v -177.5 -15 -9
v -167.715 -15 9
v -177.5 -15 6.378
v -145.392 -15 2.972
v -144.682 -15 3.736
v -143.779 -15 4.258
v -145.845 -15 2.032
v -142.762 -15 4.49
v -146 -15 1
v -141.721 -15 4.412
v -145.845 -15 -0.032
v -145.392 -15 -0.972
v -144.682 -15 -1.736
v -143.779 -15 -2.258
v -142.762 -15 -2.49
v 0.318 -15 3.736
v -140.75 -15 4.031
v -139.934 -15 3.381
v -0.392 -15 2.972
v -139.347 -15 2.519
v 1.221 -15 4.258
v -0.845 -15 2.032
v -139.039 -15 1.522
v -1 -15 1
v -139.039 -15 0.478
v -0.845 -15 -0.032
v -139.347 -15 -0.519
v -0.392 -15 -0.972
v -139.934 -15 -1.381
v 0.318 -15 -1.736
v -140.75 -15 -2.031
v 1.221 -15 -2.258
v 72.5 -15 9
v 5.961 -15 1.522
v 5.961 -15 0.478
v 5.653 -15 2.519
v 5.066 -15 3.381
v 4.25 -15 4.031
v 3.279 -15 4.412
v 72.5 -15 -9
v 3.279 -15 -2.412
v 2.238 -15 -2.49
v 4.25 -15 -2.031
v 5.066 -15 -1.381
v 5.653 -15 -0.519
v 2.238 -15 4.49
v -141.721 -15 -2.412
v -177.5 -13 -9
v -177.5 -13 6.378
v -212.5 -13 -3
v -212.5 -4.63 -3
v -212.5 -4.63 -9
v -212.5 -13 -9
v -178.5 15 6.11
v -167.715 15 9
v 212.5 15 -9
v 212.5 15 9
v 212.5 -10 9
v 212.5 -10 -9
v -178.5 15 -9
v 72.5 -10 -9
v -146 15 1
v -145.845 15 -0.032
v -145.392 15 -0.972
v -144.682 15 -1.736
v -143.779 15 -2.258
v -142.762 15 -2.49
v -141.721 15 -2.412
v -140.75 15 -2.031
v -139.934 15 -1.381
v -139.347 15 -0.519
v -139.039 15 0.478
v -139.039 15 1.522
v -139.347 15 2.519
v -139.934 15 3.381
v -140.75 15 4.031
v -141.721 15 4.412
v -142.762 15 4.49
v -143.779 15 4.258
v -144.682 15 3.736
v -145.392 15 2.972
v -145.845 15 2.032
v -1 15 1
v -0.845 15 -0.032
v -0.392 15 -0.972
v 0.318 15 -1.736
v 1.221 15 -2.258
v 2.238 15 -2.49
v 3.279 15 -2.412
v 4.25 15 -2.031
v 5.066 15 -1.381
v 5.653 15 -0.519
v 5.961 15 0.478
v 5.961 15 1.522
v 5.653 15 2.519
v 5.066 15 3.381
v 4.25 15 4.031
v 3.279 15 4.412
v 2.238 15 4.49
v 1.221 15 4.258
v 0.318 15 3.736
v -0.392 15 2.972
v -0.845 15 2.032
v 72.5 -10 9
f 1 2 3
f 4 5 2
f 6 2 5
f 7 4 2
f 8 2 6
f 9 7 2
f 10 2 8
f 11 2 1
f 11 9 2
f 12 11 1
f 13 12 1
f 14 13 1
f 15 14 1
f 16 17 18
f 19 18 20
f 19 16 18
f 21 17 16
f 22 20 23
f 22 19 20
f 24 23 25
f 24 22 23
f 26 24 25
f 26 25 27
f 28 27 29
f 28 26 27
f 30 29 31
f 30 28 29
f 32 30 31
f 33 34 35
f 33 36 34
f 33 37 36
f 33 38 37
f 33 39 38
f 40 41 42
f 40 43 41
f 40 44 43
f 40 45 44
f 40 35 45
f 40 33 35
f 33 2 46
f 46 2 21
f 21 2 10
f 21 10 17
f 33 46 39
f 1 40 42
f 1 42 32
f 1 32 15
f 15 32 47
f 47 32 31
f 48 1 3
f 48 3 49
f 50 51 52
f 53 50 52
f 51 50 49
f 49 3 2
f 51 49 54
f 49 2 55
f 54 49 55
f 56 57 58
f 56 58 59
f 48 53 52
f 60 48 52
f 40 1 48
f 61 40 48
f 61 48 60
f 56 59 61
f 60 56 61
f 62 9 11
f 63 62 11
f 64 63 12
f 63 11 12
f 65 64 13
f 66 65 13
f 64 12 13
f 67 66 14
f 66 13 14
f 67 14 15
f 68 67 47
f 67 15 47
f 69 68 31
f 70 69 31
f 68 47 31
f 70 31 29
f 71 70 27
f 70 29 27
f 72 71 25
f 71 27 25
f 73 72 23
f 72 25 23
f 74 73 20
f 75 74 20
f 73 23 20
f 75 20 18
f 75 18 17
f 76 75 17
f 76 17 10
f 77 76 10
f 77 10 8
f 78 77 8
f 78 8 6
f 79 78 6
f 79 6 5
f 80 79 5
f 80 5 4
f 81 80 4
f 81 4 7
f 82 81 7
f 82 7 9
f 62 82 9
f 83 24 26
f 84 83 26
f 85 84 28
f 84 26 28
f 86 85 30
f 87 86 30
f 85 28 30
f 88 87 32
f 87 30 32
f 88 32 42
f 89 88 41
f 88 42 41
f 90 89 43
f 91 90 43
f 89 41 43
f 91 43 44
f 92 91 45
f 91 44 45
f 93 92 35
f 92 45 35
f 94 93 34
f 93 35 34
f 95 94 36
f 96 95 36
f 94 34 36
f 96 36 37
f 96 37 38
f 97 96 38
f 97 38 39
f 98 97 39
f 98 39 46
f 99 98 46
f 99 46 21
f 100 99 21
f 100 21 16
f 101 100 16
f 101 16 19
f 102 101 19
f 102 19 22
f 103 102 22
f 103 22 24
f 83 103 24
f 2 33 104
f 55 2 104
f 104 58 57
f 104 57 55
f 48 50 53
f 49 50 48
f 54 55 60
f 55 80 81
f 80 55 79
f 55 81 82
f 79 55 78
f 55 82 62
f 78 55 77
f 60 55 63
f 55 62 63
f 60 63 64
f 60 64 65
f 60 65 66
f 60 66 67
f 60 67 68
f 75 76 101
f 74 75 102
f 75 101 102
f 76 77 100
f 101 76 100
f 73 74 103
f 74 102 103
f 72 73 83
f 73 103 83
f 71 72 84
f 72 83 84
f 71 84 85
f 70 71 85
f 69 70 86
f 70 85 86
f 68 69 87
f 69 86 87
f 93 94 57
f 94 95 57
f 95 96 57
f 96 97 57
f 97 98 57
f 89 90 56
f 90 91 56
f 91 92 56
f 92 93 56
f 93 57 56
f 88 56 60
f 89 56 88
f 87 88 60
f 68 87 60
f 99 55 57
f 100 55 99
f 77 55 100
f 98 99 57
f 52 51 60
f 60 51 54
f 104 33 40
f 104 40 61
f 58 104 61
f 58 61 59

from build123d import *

# Parameters (mm, degrees)
SKIZZE1_W                       = 18
SKIZZE1_H                       = 30
AUFSATZ_LINEAR_AUSTRAGEN1_DEPTH = 212.5
FASE1_SIZE                      = 12
FASE1_SIZE2                     = 44.784609691
F_7_0_7_DURCHMESSER_BOHRUNG1_D  = 7
SKIZZE4_W                       = 140
SKIZZE4_H                       = 5
SKIZZE4_W_2                     = 35
SKIZZE4_H_2                     = 2
SCHNITT_LINEAR_AUSTRAGEN1_DEPTH = 214.787862144
SCHNITT_LINEAR_AUSTRAGEN2_DEPTH = 214.787862144


with BuildPart() as part:
    # Skizze1 → Aufsatz-Linear austragen1 (new, symmetric)
    with BuildSketch(Plane(origin=(0, 0, 0), x_dir=(0, 0, -1), z_dir=(1, 0, 0))):
        Rectangle(SKIZZE1_W, SKIZZE1_H)
    extrude(amount=AUFSATZ_LINEAR_AUSTRAGEN1_DEPTH, both=True)

    # Fase1
    fase1_edges = [part.edges().sort_by_distance(p)[0] for p in [
        (-212.5, 0, 9),
    ]]
    fase1_side = [part.faces().sort_by_distance(p)[0] for p in [
        (-212.5, 0, 0),
    ]]
    chamfer(fase1_edges, length=FASE1_SIZE, length2=FASE1_SIZE2, reference=fase1_side[0])

    # Ø7.0 (7) Durchmesser Bohrung1 (through all)
    with Locations(Plane(origin=(0, 15, 0), x_dir=(1, 0, 0), z_dir=(0, 1, 0))):
        with Locations((-142.5, -1), (2.5, -1)):
            Hole(F_7_0_7_DURCHMESSER_BOHRUNG1_D / 2)

    # Skizze4 → Schnitt-Linear austragen1 (cut, through all)
    with BuildSketch(Plane.XY.offset(9)):
        with Locations((142.5, -12.5)):
            Rectangle(SKIZZE4_W, SKIZZE4_H)
        with Locations((-195, -14)):
            Rectangle(SKIZZE4_W_2, SKIZZE4_H_2)
    extrude(amount=-SCHNITT_LINEAR_AUSTRAGEN1_DEPTH, mode=Mode.SUBTRACT)

    # Skizze5 → Schnitt-Linear austragen2 (cut, through all)
    with BuildSketch(Plane.XY.offset(9)):
        Polygon((-178.5, 15), (-212.5, 15), (-212.5, -4.629909152), align=None)
    extrude(amount=-SCHNITT_LINEAR_AUSTRAGEN2_DEPTH, mode=Mode.SUBTRACT)


solid = part.part
